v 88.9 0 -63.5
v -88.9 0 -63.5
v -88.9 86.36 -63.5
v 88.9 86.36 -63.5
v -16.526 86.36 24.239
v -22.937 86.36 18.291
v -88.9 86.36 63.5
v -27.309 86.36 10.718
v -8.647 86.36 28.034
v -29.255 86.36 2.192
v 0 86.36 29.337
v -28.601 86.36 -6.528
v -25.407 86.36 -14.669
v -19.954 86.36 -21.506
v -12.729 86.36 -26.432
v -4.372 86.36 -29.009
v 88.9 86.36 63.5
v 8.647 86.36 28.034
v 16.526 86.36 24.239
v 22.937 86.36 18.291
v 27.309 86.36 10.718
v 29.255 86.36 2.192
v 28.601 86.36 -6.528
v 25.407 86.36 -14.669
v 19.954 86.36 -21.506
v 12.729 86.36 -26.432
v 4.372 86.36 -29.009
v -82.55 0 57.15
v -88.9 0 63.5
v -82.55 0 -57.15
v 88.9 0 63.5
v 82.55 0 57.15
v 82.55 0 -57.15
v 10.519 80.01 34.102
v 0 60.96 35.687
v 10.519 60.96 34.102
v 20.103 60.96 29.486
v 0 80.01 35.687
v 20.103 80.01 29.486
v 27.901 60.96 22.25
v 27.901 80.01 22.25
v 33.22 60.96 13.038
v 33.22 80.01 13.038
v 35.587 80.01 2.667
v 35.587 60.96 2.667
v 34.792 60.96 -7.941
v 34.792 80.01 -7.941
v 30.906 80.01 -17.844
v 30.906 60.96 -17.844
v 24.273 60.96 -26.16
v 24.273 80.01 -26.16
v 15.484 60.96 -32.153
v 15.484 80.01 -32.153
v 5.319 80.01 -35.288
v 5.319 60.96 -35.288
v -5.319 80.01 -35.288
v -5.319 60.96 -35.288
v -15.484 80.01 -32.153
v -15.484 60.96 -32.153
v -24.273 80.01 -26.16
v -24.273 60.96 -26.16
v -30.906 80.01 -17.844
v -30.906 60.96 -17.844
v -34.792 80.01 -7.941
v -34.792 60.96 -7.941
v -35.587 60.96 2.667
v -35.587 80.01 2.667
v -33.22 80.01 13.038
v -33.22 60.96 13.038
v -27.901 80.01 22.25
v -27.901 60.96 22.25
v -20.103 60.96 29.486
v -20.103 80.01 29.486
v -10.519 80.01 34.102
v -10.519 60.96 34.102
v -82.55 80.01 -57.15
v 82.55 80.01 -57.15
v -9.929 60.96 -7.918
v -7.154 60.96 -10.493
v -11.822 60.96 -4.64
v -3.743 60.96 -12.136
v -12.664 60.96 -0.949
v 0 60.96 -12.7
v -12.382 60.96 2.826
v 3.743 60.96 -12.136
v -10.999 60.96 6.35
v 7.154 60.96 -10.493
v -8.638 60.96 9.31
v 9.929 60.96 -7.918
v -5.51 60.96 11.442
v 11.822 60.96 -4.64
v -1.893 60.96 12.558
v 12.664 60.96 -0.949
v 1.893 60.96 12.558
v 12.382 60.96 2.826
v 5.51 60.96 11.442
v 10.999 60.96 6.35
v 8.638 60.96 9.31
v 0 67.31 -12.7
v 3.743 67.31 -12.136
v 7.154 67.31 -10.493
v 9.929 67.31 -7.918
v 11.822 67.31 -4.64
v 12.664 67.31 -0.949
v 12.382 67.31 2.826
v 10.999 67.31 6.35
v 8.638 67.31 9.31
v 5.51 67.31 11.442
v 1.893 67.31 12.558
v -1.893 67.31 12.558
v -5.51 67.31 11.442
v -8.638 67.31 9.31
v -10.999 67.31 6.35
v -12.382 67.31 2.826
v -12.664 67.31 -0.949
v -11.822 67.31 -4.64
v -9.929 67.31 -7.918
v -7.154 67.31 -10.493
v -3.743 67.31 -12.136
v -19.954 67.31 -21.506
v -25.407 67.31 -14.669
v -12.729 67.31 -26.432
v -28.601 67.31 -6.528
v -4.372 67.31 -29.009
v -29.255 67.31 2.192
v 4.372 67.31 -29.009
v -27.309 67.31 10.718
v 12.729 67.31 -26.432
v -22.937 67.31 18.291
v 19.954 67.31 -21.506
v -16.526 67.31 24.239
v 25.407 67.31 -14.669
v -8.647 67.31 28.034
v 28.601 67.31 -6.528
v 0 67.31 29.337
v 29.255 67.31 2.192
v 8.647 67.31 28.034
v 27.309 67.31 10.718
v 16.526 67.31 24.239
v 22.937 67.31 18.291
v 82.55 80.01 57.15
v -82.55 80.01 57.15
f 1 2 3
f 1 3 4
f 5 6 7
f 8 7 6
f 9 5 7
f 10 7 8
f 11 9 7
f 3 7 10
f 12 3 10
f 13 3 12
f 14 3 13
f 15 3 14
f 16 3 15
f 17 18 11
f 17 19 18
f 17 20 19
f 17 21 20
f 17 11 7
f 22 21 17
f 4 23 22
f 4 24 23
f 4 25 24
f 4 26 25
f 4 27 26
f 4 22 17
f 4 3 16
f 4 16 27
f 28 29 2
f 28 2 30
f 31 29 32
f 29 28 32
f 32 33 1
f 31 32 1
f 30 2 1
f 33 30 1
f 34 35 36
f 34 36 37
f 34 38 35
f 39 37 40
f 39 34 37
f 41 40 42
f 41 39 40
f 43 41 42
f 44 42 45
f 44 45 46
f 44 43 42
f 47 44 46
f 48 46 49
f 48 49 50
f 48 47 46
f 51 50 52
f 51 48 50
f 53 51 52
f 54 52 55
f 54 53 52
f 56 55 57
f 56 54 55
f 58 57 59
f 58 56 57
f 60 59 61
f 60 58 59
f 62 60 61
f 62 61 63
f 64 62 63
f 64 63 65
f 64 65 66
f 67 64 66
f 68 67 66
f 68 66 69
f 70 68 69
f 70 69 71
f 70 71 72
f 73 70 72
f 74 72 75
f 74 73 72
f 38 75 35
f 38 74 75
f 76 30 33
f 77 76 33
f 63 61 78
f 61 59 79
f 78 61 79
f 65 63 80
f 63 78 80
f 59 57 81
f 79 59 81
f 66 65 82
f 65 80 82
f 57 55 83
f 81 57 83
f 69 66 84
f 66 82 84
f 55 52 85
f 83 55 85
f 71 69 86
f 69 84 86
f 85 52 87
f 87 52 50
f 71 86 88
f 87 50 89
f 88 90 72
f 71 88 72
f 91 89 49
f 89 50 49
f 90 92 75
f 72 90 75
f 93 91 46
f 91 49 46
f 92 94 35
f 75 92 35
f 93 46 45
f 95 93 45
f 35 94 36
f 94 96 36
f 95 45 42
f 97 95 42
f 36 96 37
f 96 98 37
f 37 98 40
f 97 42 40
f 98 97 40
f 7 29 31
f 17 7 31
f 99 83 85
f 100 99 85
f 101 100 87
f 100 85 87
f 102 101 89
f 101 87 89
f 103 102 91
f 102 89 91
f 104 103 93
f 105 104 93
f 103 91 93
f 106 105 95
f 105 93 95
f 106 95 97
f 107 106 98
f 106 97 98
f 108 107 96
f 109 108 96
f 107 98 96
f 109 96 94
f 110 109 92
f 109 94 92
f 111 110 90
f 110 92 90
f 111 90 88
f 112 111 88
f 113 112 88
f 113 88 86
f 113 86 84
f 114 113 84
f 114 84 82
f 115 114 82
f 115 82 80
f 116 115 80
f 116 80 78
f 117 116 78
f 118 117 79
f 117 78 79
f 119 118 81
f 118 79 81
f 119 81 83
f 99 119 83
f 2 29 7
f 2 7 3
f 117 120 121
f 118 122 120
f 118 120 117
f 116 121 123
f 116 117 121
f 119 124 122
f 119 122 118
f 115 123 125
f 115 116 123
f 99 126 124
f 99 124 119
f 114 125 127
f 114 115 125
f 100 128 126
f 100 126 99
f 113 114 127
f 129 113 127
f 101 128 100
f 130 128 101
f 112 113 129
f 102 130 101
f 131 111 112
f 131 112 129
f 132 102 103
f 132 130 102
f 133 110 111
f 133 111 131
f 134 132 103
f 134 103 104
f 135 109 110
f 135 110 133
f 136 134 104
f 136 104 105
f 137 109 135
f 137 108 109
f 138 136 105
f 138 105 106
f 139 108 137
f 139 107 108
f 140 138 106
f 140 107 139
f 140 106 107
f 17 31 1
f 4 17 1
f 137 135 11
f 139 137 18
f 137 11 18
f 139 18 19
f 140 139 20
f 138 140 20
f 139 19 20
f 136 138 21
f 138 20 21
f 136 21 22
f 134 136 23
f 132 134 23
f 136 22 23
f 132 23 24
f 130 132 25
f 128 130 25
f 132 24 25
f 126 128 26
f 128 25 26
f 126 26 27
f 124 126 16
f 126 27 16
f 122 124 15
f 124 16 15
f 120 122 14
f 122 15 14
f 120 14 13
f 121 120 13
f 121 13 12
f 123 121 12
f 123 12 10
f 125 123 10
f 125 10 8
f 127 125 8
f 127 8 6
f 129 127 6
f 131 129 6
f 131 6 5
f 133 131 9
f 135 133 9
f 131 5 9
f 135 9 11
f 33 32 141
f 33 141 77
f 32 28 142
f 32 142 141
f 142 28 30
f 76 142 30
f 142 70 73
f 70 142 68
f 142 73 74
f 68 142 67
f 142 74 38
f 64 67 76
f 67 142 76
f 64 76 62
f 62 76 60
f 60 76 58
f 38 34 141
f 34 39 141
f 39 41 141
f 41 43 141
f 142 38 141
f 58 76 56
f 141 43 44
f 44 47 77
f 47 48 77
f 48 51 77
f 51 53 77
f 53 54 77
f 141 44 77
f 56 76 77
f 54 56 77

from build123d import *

# Parameters (mm, degrees)
SKETCH1_W           = 177.8
SKETCH1_H           = 127
BOSS_EXTRUDE1_DEPTH = 86.36
SKETCH2_R           = 29.337
CUT_EXTRUDE1_DEPTH  = 19.05
SHELL1_T            = -6.35
SKETCH4_R           = 12.7
CUT_EXTRUDE2_DEPTH  = 6.35


with BuildPart() as part:
    # Sketch1 → Boss-Extrude1 (new body)
    with BuildSketch(Plane(origin=(0, 0, 0), x_dir=(1, 0, 0), z_dir=(0, 1, 0))):
        Rectangle(SKETCH1_W, SKETCH1_H)
    extrude(amount=BOSS_EXTRUDE1_DEPTH)

    # Sketch2 → Cut-Extrude1 (cut)
    with BuildSketch(Plane(origin=(0, 86.36, 0), x_dir=(1, 0, 0), z_dir=(0, 1, 0))):
        with Locations(Location((0, 0, 0), (0, 0, 270))):
            Circle(SKETCH2_R)
    extrude(amount=-CUT_EXTRUDE1_DEPTH, mode=Mode.SUBTRACT)

    # Shell1
    shell1_openings = [part.faces().sort_by_distance(p)[0] for p in [
        (0, 0, 0),
    ]]
    offset(amount=SHELL1_T, openings=shell1_openings, kind=Kind.INTERSECTION)

    # Sketch4 → Cut-Extrude2 (cut)
    with BuildSketch(Plane.XZ.offset(-60.96)):
        with Locations(Location((0, 0, 0), (0, 0, 270))):
            Circle(SKETCH4_R)
    extrude(amount=-CUT_EXTRUDE2_DEPTH, mode=Mode.SUBTRACT)


solid = part.part
